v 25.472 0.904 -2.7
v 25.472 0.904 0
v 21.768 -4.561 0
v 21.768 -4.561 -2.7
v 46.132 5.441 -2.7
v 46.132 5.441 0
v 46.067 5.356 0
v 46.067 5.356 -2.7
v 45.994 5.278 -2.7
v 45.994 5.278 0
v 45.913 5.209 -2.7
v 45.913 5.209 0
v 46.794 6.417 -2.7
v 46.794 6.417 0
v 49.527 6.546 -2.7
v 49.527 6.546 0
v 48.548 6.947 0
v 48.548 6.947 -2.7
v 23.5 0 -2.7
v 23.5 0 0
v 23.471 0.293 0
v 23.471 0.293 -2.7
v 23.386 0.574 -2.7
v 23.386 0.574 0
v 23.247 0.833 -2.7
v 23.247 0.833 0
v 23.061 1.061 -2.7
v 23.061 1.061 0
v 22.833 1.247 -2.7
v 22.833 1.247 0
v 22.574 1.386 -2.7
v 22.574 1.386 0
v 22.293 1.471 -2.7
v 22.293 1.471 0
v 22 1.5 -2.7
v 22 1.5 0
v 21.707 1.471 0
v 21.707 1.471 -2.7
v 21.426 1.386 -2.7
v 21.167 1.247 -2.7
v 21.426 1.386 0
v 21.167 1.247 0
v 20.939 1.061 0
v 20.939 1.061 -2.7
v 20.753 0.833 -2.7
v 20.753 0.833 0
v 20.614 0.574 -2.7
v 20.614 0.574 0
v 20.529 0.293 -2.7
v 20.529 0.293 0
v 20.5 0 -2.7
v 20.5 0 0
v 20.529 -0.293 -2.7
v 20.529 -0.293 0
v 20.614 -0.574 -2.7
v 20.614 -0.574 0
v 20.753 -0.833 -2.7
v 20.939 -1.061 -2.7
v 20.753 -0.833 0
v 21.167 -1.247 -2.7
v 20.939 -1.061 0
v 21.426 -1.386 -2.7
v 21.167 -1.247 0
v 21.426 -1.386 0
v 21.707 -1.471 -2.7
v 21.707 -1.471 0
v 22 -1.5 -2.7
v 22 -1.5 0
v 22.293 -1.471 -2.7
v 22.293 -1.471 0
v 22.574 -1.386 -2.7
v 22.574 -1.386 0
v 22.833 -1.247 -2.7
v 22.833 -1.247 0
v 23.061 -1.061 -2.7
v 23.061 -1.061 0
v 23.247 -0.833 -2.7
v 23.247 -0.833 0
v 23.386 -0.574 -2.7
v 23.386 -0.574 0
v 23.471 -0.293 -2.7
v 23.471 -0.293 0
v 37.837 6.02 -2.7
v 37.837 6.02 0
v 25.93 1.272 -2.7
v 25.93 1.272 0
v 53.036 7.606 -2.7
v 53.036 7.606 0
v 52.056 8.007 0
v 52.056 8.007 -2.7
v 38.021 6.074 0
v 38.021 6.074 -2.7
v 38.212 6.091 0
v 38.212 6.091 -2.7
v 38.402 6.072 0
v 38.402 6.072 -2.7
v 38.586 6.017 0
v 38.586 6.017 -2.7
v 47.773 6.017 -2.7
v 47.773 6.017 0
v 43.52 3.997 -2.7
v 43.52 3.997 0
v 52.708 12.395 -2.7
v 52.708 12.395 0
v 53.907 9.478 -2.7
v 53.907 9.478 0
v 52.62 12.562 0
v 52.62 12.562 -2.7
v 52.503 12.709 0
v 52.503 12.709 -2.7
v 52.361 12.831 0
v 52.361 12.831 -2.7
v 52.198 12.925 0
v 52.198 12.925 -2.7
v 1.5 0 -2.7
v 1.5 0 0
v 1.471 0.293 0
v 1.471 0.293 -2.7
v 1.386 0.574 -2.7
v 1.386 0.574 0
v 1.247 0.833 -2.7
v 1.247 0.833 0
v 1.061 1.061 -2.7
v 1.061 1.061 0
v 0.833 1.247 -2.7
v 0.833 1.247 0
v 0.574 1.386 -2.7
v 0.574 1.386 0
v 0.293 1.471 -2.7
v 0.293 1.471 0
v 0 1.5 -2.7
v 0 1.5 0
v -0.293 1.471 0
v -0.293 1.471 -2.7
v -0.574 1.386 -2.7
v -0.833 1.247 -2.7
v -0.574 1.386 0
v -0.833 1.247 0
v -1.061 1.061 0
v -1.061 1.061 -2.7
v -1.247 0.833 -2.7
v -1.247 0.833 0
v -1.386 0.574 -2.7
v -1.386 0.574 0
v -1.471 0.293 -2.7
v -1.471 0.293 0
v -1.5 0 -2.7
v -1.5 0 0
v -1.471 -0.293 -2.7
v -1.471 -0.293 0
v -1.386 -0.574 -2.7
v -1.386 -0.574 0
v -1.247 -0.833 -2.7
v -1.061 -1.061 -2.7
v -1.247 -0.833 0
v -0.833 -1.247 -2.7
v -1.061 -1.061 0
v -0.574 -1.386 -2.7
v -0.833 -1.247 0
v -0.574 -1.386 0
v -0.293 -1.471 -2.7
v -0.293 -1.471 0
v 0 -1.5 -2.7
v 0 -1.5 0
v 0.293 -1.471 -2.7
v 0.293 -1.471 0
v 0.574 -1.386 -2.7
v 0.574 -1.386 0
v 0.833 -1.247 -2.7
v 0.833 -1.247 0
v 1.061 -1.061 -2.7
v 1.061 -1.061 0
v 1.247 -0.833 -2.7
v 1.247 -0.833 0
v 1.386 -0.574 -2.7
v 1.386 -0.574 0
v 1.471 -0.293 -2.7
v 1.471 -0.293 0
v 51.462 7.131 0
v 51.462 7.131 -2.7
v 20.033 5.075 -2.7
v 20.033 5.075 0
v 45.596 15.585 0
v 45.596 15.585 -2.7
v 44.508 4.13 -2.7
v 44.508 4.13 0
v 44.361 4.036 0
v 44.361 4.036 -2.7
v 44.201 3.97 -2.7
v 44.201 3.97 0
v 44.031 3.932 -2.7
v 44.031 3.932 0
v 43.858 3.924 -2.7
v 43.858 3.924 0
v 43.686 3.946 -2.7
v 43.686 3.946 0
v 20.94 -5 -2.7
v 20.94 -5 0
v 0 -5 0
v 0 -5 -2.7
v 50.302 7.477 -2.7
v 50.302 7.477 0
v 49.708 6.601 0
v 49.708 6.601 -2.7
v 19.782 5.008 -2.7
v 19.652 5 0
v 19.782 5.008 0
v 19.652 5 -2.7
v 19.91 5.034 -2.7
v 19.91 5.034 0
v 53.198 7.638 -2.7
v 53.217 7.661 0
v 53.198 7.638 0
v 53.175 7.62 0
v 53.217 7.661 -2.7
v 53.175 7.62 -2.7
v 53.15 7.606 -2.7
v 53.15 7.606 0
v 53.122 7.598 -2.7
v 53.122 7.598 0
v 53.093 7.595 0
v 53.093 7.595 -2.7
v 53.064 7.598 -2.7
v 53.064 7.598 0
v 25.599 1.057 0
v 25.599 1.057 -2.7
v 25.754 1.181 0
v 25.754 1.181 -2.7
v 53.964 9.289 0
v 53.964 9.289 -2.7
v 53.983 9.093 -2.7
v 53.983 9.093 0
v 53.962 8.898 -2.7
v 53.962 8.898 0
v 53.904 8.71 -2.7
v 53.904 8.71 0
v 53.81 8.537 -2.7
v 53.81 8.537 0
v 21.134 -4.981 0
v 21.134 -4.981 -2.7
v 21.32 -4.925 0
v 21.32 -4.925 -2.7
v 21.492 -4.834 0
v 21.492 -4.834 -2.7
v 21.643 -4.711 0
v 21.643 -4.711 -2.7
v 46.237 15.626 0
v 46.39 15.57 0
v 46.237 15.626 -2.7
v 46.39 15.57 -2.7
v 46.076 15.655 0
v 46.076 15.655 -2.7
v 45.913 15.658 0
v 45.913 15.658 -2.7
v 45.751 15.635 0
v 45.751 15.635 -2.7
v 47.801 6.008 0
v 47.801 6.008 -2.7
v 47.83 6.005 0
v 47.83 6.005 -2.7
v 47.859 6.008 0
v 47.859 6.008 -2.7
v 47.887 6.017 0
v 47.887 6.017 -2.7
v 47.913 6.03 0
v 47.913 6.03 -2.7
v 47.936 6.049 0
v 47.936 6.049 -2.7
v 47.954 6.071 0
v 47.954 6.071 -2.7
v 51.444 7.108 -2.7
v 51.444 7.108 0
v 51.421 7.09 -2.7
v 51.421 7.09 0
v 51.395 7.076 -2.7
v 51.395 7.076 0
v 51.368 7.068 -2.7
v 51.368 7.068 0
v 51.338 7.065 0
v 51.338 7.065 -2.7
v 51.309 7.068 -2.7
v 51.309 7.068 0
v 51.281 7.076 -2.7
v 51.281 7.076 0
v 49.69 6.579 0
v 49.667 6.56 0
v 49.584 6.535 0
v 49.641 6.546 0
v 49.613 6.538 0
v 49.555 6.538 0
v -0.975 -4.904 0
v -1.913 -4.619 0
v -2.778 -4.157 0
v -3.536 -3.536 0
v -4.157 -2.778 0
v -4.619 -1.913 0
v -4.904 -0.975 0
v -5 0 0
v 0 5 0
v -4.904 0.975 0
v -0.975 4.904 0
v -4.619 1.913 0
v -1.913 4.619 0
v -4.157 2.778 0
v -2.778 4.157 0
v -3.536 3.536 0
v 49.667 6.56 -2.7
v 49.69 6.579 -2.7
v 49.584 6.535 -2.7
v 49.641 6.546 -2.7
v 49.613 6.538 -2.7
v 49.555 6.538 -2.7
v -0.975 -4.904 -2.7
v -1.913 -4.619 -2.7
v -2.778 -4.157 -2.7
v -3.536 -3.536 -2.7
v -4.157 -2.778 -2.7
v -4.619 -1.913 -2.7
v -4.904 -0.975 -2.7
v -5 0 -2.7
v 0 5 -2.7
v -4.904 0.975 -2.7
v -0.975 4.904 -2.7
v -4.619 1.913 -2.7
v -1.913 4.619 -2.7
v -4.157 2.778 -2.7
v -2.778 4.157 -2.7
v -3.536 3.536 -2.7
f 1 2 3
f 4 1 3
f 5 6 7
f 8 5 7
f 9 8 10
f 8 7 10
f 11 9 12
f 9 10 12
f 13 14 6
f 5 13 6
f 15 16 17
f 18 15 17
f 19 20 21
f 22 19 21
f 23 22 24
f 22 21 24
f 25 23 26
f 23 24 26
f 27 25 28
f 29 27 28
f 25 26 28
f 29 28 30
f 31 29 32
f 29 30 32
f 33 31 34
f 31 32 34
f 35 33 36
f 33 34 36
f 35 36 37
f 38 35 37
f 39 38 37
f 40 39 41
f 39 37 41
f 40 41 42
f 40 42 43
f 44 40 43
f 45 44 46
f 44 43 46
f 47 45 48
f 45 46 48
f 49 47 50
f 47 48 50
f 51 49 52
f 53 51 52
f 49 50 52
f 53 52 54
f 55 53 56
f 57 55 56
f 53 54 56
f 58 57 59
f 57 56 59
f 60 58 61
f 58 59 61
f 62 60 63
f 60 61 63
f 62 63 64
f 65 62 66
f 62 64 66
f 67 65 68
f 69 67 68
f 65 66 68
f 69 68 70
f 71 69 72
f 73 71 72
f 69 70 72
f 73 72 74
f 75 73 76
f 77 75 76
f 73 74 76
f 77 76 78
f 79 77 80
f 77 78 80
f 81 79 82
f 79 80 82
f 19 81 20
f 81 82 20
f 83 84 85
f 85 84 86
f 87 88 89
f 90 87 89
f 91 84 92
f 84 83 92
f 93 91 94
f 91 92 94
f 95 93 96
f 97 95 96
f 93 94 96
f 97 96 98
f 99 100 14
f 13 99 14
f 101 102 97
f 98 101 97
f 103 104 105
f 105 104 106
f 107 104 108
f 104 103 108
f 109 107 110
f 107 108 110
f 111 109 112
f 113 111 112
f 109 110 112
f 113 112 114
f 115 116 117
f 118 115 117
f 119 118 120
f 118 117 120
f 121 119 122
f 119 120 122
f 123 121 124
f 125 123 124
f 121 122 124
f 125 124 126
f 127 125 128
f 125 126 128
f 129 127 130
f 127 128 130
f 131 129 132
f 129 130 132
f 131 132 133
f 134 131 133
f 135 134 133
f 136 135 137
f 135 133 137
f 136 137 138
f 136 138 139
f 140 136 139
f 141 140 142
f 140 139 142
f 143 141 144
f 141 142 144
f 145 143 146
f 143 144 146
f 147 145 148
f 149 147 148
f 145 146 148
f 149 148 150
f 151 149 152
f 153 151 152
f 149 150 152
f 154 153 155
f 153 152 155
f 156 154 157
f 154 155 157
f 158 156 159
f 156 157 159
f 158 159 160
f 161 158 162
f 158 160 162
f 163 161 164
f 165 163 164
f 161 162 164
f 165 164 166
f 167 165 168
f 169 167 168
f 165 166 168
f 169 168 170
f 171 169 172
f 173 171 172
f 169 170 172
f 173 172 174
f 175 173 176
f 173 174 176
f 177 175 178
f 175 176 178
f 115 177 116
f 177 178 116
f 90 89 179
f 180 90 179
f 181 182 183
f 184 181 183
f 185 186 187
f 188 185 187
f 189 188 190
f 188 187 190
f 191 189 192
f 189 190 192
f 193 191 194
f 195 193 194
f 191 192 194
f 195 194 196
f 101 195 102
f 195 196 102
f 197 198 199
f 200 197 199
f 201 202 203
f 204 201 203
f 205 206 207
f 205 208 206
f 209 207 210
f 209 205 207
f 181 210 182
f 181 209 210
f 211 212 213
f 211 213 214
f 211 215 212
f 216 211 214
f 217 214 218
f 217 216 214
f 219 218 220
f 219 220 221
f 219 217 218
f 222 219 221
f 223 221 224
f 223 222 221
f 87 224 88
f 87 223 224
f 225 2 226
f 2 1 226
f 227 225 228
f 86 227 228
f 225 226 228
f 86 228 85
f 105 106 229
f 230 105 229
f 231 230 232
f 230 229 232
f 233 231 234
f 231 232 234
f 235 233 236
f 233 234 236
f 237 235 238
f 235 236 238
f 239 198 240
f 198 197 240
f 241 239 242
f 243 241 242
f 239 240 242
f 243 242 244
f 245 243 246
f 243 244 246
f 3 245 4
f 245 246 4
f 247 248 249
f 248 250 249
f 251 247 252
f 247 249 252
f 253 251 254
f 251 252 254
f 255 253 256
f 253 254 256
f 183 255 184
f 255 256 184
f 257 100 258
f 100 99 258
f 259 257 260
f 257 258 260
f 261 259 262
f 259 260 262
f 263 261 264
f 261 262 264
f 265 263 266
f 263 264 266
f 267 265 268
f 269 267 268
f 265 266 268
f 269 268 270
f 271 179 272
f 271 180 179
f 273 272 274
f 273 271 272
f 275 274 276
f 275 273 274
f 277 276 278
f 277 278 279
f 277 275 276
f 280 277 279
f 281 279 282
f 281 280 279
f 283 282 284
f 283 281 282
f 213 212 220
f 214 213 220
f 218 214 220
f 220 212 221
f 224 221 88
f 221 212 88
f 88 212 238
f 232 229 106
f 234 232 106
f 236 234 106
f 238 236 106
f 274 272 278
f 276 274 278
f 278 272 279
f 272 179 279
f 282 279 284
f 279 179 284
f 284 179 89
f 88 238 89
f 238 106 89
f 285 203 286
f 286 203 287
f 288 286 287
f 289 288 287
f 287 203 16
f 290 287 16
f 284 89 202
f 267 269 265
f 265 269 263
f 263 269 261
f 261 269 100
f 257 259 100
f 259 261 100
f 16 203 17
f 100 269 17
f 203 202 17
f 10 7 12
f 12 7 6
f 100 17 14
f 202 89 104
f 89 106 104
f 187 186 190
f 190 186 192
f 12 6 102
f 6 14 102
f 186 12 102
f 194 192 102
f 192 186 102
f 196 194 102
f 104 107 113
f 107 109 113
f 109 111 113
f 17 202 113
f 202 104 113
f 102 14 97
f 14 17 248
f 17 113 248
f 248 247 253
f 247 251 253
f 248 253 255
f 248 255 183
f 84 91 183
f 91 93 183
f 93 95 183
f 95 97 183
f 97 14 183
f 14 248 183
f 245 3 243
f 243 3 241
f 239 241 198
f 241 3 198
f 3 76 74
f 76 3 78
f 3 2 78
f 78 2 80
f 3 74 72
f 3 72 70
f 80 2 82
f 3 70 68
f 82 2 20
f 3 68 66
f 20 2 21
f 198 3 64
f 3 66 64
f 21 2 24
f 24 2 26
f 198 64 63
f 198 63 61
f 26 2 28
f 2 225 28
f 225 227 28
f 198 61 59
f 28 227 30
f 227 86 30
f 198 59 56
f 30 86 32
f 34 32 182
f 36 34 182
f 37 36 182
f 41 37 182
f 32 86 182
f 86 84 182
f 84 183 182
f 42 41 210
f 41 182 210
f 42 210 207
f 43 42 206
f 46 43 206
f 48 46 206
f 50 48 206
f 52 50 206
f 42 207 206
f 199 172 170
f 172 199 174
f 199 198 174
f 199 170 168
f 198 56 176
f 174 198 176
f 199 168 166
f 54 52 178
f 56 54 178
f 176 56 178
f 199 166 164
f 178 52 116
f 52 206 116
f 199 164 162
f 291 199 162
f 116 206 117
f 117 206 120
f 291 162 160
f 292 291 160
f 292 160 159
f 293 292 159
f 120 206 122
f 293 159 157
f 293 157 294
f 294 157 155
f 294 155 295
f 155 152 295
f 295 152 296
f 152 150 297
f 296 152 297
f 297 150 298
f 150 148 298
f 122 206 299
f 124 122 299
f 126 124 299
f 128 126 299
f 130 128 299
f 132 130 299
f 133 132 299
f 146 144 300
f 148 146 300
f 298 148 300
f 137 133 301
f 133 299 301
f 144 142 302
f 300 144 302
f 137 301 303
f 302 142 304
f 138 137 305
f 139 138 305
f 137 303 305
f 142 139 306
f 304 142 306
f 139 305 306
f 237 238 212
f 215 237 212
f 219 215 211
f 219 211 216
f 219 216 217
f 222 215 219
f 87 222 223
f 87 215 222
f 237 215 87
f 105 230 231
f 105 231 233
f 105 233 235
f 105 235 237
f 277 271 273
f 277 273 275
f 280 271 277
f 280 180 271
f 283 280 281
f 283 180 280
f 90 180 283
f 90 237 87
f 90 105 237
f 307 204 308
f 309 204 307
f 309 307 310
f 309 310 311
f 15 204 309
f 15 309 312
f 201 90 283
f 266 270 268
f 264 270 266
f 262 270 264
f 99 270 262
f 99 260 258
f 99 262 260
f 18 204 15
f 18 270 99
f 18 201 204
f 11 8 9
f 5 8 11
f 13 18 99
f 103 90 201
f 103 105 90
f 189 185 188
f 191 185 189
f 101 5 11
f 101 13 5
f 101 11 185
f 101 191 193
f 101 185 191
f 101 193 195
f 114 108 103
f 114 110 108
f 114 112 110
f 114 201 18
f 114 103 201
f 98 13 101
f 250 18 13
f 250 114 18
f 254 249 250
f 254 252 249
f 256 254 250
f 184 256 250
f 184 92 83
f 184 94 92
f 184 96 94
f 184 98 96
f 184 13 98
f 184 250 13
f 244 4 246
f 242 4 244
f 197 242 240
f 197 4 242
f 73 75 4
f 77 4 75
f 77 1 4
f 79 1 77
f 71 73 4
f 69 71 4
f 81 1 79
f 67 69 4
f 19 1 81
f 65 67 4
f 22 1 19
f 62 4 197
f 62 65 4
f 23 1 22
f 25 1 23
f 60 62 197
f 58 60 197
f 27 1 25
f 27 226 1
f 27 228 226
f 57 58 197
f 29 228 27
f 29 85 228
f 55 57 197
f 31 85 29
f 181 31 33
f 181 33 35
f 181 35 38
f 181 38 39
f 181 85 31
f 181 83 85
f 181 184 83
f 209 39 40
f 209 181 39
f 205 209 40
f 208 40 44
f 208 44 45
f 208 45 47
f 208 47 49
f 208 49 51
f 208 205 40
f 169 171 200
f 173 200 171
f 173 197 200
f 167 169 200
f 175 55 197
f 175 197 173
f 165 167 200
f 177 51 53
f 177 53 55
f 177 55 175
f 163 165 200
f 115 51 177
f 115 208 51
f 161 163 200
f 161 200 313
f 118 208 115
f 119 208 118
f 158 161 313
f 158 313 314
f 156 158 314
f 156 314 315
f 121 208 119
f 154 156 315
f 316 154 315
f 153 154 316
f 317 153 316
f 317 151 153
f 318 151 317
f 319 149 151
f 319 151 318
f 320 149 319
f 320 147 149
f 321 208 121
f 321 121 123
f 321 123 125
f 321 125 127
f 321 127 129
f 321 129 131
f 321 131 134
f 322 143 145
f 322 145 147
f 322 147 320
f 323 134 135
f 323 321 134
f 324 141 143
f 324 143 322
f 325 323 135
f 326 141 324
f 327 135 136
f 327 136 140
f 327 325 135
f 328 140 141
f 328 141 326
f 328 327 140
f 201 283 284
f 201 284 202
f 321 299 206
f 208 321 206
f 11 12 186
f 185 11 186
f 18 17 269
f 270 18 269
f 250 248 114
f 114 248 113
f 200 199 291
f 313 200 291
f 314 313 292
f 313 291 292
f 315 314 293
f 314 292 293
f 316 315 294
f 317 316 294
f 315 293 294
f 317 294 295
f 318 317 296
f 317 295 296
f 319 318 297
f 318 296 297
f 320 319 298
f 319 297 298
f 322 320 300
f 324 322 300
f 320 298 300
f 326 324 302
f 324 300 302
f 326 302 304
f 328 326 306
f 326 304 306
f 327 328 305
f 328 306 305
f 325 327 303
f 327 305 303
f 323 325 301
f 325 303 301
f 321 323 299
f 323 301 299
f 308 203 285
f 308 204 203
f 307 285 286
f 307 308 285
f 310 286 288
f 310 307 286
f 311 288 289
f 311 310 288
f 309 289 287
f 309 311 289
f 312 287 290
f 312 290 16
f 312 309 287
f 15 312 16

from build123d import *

# Parameters (mm, degrees)
SKETCH1_R           = 1.5
BOSS_EXTRUDE1_DEPTH = 2.7
FILLET1_R           = 0.15
FILLET2_R           = 1
FILLET3_R           = 1
FILLET4_R           = 1


with BuildPart() as part:
    # Sketch1 → Boss-Extrude1 (new body)
    with BuildSketch(Plane.XY):
        with BuildLine():
            Line((0, 5), (19.85, 5))
            Line((19.85, 5), (45.99619398, 15.75))
            Line((45.99619398, 15.75), (52.557536486, 12.761206845))
            Line((52.557536486, 12.761206845), (53.907471601, 9.477889135))
            ThreePointArc((53.907471601, 9.477889135), (53.977314115, 8.995006796), (53.810360044, 8.536553233))
            Line((53.810360044, 8.536553233), (53.148294507, 7.559788561))
            Line((53.148294507, 7.559788561), (52.056234711, 8.006784537))
            Line((52.056234711, 8.006784537), (51.394169174, 7.030019865))
            Line((51.394169174, 7.030019865), (50.302109378, 7.477015841))
            Line((50.302109378, 7.477015841), (49.640043841, 6.500251169))
            Line((49.640043841, 6.500251169), (48.547984045, 6.947247144))
            Line((48.547984045, 6.947247144), (47.885918508, 5.970482472))
            Line((47.885918508, 5.970482472), (46.793858712, 6.417478448))
            Line((46.793858712, 6.417478448), (46.131793175, 5.440713776))
            ThreePointArc((46.131793175, 5.440713776), (46.03170075, 5.315863389), (45.912975416, 5.208576821))
            Line((45.912975416, 5.208576821), (44.507662892, 4.129714813))
            ThreePointArc((44.507662892, 4.129714813), (44.031433487, 3.93177062), (43.519903831, 3.997449854))
            Line((43.519903831, 3.997449854), (38.212047423, 6.170032768))
            Line((38.212047423, 6.170032768), (25.644379319, 1.158584034))
            Line((25.644379319, 1.158584034), (21.47, -5))
            Line((21.47, -5), (0, -5))
            ThreePointArc((0, -5), (-5, 0), (0, 5))
        make_face()
        Circle(SKETCH1_R, mode=Mode.SUBTRACT)
        with Locations((22, 0)):
            Circle(SKETCH1_R, mode=Mode.SUBTRACT)
    extrude(amount=-BOSS_EXTRUDE1_DEPTH)

    # Fillet1
    fillet1_edges = [part.edges().sort_by_distance(p)[0] for p in [
        (53.148294507, 7.559788561, -1.35),
        (51.394169174, 7.030019865, -1.35),
        (49.640043841, 6.500251169, -1.35),
        (47.885918508, 5.970482472, -1.35),
    ]]
    fillet(fillet1_edges, radius=FILLET1_R)

    # Fillet2
    fillet2_edges = [part.edges().sort_by_distance(p)[0] for p in [
        (21.47, -5, -1.35),
        (45.99619398, 15.75, -1.35),
        (52.557536486, 12.761206845, -1.35),
    ]]
    fillet(fillet2_edges, radius=FILLET2_R)

    # Fillet3
    fillet3_edges = [part.edges().sort_by_distance(p)[0] for p in [
        (38.212047423, 6.170032768, -1.35),
        (25.644379319, 1.158584034, -1.35),
    ]]
    fillet(fillet3_edges, radius=FILLET3_R)

    # Fillet4
    fillet4_edges = [part.edges().sort_by_distance(p)[0] for p in [
        (19.85, 5, -1.35),
    ]]
    fillet(fillet4_edges, radius=FILLET4_R)


solid = part.part
